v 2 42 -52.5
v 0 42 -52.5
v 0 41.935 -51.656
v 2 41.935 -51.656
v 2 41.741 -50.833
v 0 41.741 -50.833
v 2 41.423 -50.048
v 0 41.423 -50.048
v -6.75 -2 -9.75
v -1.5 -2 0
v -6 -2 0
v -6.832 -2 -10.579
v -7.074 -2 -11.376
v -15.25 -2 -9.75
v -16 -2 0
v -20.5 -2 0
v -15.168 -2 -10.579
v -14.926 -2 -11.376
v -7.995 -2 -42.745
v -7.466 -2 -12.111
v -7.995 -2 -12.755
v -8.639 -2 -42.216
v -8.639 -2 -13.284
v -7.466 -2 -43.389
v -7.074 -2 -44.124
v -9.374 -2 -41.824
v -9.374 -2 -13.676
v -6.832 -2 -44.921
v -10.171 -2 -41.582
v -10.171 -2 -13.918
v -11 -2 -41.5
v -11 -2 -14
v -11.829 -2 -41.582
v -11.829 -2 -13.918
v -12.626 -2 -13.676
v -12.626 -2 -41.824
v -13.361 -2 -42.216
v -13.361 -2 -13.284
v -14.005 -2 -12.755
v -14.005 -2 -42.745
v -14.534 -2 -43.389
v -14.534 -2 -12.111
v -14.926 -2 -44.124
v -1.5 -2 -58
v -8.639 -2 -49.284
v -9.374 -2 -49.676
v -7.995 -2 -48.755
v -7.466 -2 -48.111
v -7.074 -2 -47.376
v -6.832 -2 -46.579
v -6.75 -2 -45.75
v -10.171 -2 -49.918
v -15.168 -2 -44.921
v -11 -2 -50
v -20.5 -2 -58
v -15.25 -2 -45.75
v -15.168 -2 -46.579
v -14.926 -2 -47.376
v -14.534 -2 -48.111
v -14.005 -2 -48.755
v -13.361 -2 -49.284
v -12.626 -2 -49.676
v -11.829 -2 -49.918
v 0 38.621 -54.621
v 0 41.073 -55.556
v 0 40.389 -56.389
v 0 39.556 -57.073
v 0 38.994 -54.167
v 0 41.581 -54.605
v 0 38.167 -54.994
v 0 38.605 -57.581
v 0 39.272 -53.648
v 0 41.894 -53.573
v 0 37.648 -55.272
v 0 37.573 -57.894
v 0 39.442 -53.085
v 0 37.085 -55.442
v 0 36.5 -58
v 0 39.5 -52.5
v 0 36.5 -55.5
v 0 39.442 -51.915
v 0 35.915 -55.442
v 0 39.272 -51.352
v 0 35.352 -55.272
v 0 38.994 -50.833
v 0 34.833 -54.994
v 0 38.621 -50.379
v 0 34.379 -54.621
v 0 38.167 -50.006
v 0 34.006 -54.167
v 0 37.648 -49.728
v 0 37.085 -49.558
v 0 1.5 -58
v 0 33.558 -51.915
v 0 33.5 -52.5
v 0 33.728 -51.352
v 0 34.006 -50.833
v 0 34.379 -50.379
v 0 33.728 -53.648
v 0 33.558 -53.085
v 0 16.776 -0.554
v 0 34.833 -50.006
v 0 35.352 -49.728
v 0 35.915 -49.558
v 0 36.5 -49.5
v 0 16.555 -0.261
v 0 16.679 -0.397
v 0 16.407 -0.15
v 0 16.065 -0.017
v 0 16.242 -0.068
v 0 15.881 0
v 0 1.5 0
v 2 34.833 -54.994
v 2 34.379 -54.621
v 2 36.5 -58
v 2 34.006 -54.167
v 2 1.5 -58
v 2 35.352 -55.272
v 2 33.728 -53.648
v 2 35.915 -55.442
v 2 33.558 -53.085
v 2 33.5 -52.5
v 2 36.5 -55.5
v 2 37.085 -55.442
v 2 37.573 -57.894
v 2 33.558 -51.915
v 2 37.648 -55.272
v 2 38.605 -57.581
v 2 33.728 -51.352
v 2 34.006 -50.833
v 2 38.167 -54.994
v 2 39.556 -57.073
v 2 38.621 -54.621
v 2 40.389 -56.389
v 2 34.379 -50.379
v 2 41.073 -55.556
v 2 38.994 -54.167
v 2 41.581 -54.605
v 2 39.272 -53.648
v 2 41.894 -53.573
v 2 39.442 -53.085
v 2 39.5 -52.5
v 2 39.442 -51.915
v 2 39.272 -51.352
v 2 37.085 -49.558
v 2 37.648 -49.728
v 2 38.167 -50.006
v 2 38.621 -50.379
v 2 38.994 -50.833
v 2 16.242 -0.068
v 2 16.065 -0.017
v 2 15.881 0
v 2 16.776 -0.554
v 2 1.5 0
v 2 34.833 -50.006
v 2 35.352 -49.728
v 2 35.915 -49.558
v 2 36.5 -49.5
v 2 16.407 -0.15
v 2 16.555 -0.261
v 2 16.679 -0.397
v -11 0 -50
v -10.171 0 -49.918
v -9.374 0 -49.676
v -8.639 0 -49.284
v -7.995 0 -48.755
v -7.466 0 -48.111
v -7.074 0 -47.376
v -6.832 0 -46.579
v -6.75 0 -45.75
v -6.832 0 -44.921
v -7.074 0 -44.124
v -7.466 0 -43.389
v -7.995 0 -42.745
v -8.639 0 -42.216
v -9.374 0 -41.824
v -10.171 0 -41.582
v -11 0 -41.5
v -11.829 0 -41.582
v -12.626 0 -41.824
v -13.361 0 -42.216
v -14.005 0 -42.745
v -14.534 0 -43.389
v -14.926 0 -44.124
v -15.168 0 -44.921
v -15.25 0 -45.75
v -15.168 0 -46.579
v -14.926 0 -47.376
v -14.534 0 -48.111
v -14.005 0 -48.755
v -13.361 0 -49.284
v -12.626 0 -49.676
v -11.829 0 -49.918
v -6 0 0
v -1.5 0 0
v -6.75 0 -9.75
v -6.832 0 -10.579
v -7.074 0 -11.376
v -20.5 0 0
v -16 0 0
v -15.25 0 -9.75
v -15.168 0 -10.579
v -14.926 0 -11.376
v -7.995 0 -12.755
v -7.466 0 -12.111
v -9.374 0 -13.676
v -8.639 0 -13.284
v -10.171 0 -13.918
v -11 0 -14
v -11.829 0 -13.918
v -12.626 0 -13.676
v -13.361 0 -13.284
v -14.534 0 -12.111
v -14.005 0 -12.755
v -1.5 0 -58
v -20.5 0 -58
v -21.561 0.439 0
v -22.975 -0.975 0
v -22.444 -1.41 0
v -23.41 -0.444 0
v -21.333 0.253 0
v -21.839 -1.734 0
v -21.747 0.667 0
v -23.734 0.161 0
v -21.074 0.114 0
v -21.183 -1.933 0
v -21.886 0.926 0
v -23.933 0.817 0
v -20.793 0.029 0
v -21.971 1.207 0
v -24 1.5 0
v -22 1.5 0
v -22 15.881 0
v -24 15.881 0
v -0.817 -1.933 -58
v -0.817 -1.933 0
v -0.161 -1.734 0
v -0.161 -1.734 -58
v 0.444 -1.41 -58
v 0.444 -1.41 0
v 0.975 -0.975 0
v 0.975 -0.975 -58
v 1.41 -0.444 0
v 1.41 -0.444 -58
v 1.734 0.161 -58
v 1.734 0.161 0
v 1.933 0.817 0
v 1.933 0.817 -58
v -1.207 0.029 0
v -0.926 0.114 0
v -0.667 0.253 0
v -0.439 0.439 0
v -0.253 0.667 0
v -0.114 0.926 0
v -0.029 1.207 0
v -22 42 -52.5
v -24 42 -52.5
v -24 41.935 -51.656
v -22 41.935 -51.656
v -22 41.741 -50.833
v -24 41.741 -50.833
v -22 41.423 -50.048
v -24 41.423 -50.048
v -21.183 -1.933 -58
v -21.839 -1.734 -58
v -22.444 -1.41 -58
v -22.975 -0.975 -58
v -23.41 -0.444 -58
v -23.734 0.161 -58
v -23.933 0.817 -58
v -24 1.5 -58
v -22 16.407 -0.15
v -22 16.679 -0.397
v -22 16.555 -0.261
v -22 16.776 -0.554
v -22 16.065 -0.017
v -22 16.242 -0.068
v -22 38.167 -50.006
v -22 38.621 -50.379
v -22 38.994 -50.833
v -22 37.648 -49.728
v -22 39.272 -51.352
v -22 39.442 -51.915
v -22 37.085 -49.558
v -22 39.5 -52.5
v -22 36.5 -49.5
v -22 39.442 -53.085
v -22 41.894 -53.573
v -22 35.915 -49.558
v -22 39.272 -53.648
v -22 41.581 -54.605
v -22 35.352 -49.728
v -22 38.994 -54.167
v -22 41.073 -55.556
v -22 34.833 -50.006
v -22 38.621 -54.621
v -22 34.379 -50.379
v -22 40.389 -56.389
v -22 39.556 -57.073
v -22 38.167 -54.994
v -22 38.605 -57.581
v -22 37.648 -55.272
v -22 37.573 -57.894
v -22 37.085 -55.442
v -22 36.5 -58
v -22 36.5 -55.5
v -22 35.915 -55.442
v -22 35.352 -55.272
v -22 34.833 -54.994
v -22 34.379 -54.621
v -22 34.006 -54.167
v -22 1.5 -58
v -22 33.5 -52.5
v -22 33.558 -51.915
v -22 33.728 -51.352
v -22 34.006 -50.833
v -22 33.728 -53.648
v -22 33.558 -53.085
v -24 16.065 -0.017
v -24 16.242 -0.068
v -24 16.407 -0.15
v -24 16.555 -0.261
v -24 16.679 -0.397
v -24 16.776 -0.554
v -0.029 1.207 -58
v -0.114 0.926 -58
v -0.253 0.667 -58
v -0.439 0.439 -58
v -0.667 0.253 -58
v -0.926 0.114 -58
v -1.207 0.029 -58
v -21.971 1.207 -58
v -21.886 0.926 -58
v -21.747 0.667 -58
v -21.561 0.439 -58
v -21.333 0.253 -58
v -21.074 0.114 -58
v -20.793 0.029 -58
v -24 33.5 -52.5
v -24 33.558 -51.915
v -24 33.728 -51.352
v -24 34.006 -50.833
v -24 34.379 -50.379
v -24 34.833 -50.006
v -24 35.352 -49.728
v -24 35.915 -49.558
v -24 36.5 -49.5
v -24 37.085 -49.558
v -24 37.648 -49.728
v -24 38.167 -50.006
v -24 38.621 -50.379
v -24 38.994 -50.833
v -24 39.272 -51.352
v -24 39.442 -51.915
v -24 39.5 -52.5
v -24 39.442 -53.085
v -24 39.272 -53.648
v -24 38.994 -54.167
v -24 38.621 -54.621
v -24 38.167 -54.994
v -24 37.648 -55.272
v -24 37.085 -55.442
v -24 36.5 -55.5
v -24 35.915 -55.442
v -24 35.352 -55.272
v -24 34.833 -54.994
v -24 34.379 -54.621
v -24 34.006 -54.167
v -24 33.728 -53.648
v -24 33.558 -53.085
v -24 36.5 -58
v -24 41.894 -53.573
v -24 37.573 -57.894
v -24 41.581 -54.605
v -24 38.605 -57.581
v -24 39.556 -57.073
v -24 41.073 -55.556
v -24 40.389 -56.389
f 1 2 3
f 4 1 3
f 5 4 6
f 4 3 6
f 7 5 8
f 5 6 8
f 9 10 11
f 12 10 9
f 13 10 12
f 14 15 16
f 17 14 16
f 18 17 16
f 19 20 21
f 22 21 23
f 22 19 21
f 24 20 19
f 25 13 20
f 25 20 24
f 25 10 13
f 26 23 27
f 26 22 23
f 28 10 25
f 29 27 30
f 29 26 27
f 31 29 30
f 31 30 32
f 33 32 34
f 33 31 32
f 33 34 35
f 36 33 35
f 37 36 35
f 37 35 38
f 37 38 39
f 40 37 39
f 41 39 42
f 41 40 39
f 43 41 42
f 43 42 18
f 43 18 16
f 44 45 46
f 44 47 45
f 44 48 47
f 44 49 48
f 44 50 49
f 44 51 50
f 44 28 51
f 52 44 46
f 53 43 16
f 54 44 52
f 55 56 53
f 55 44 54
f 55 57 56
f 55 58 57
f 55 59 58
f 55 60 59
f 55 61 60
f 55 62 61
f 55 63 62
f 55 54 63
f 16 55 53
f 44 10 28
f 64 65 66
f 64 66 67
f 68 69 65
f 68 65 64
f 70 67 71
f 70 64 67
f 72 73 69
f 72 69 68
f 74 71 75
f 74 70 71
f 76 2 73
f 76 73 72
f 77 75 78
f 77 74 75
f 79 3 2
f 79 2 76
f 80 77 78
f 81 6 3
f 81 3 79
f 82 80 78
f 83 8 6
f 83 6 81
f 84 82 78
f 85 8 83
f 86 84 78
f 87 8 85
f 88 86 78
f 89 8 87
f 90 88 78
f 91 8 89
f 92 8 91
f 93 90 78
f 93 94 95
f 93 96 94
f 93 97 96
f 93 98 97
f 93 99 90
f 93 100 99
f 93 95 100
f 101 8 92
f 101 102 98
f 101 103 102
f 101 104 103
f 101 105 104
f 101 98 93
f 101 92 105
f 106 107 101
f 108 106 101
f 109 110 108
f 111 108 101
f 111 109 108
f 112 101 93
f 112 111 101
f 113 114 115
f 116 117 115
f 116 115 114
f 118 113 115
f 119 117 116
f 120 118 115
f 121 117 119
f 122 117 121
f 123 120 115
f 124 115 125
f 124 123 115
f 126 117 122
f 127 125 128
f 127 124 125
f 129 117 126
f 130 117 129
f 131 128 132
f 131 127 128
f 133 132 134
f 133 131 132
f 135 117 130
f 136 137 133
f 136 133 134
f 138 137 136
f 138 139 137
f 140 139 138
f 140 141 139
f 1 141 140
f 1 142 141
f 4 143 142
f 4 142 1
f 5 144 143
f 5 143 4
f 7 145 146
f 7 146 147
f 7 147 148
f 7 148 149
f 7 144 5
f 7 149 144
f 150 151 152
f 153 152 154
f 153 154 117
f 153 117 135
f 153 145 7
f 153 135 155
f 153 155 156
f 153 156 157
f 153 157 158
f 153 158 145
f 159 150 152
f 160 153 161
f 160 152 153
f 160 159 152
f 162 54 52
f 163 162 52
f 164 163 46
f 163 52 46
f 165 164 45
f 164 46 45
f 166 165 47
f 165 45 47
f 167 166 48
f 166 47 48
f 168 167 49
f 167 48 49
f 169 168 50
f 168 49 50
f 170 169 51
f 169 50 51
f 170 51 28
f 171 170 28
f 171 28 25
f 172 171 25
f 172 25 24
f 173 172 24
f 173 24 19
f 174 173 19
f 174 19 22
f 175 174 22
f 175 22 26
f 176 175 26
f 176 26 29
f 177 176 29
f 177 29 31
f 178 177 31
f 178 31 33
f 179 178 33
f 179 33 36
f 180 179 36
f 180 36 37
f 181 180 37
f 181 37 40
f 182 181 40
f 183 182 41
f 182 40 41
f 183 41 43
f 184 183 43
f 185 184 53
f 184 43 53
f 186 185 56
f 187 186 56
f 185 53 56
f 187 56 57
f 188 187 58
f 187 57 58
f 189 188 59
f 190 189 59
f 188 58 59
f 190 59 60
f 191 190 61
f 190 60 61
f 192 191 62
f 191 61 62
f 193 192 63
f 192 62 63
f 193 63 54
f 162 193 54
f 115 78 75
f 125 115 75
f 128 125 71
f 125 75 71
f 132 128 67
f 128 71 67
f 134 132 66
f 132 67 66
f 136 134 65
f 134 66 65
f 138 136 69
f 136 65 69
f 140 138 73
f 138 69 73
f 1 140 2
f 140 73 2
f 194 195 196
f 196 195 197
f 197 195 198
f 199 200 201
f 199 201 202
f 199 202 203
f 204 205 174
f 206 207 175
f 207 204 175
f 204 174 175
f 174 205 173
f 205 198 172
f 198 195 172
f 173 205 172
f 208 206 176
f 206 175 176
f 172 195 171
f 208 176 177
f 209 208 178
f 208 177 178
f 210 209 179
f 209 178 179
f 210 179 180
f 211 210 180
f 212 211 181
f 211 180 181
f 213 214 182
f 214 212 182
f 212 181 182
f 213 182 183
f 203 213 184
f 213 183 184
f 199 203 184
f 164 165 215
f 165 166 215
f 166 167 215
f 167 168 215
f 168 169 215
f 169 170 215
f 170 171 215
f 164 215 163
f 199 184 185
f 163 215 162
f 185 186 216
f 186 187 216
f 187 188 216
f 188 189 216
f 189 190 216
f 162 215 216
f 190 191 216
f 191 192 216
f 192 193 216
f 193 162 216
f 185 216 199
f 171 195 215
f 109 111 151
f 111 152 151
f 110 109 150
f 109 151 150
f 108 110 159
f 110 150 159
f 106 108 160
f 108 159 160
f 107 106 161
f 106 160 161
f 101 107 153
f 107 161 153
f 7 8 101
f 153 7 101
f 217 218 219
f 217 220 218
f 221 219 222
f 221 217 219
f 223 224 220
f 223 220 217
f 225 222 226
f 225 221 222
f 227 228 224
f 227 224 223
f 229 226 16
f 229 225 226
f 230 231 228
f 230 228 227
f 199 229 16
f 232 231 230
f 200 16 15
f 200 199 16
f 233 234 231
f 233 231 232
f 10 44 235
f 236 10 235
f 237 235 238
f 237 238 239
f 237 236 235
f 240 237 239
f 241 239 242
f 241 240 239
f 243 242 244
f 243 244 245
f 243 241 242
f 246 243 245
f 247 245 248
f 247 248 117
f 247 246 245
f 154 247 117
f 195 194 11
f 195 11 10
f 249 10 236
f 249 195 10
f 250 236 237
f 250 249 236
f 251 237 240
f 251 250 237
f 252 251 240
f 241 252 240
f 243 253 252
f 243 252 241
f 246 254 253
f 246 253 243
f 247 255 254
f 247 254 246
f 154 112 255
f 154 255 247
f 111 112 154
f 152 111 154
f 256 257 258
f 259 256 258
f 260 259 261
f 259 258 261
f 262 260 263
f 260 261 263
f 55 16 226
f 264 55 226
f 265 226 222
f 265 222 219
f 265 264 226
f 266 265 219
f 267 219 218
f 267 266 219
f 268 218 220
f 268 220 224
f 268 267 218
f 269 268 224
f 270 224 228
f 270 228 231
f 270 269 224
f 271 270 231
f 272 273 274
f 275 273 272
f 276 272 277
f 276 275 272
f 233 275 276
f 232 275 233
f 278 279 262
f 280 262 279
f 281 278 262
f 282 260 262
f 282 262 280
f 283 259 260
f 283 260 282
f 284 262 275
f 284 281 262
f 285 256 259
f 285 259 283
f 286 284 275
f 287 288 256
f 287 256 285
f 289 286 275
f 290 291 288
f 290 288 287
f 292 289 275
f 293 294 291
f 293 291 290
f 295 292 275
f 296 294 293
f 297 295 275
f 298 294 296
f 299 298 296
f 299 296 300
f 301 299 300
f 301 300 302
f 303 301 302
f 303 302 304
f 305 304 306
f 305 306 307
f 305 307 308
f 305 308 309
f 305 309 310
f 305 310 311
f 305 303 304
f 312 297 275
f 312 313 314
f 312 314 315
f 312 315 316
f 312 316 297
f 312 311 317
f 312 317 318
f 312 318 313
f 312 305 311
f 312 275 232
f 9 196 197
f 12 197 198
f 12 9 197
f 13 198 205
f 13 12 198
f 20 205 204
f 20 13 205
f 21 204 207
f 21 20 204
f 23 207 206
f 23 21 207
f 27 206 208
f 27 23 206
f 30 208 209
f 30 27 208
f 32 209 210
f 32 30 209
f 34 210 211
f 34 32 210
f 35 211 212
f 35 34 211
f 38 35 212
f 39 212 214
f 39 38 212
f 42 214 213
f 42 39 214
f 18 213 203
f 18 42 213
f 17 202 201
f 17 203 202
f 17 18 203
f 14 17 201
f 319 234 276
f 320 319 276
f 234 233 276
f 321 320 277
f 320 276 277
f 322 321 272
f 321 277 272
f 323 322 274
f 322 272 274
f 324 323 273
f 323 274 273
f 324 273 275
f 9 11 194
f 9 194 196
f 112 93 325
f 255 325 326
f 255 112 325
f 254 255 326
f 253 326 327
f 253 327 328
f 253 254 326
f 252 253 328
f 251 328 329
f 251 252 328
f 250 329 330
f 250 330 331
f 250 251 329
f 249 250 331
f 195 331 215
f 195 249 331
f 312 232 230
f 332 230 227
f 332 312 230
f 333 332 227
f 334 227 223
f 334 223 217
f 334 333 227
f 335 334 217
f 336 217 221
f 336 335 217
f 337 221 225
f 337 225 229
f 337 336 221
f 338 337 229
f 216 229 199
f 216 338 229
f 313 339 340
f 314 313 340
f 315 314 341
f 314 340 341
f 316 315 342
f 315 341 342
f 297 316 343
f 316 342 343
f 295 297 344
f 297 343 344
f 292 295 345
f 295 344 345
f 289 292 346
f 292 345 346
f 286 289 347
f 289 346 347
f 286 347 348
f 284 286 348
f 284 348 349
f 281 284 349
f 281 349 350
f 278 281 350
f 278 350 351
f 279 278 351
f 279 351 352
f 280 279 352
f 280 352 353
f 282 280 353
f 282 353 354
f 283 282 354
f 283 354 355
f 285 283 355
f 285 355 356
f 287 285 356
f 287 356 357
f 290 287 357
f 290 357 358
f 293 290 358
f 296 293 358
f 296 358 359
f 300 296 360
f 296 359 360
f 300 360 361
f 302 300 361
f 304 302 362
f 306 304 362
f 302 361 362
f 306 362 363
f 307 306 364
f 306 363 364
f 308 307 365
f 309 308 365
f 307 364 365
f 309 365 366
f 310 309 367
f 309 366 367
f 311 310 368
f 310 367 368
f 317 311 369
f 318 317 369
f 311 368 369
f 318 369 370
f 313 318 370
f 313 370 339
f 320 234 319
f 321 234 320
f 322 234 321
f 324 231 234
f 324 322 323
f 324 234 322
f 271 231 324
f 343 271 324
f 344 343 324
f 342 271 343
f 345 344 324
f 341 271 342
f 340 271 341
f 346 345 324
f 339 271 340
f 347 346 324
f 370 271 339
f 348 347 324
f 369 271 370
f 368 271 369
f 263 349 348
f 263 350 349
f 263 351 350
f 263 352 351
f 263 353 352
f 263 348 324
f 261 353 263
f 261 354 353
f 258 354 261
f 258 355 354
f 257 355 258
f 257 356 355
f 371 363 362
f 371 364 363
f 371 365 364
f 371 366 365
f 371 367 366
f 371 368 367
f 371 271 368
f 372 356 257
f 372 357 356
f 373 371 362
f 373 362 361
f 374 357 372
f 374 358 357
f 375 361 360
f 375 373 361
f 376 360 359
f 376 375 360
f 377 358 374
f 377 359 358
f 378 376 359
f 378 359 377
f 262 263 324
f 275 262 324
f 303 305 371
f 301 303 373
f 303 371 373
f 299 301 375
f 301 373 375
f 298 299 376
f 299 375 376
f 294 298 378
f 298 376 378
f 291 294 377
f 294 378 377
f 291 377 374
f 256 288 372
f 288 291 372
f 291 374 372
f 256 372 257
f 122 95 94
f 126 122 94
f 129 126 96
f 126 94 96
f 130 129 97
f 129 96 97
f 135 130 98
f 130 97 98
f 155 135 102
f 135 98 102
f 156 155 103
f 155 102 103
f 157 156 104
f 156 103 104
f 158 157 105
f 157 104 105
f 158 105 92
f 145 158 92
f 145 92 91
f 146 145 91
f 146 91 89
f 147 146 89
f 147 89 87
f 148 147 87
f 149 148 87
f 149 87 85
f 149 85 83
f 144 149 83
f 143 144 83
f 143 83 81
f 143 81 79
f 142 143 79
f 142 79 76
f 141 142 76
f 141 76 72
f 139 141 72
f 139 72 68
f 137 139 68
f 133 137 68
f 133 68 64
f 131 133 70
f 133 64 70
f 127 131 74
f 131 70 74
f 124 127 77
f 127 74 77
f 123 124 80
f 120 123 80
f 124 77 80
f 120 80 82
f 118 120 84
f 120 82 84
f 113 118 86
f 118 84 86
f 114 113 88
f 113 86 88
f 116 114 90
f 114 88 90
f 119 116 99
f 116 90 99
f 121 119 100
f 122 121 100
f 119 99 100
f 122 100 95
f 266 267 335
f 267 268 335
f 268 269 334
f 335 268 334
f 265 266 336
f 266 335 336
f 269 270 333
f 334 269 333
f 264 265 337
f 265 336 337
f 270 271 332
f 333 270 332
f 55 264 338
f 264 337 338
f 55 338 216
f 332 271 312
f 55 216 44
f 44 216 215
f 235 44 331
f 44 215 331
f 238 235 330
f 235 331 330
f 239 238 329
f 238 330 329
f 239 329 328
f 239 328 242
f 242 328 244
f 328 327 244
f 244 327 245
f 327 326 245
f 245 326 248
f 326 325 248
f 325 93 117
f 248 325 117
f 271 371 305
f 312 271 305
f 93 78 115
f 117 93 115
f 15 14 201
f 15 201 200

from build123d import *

# Parameters (mm, degrees)
BASE_FLANGIA1_DEPTH            = 2
BORDO_FLANGIA1_STRIP_W         = 11
BORDO_FLANGIA1_STRIP_H         = 2
BORDO_FLANGIA1_STRIP_CUT_DEPTH = 58
BORDO_FLANGIA1_DEPTH           = 58
BORDO_FLANGIA2_STRIP_W         = 11
BORDO_FLANGIA2_STRIP_H         = 2
BORDO_FLANGIA2_STRIP_CUT_DEPTH = 58
BORDO_FLANGIA2_DEPTH           = 58
SCHIZZO11_R                    = 3
TAGLIO_ESTRUSIONE1_DEPTH       = 50
RACCORDO2_R                    = 1
SCHIZZO16_R                    = 4.25
TAGLIO_ESTRUSIONE2_DEPTH       = 10


# Sheet-metal steps are written as plain solids
with BuildPart() as part:
    # Schizzo1 → Base-Flangia1 (new body)
    with BuildSketch(Plane(origin=(0, 0, 0), x_dir=(1, 0, 0), z_dir=(0, 1, 0))):
        Polygon((0, 0), (-6, 0), (-16, 0), (-22, 0), (-22, 58), (0, 58), align=None)
    extrude(amount=-BASE_FLANGIA1_DEPTH)

    # Bordo-Flangia1 strip (across the edge) → Bordo-Flangia1 strip cut (cut)
    with BuildSketch(Plane(origin=(-22, 0, -58), x_dir=(1, 0, 0), z_dir=(0, 0, 1))):
        with Locations((-4, -1)):
            Rectangle(BORDO_FLANGIA1_STRIP_W, BORDO_FLANGIA1_STRIP_H)
    extrude(amount=BORDO_FLANGIA1_STRIP_CUT_DEPTH, mode=Mode.SUBTRACT)

    # Bordo-Flangia1 section (across the edge) → Bordo-Flangia1 (add)
    with BuildSketch(Plane(origin=(-22, 0, -58), x_dir=(1, 0, 0), z_dir=(0, 0, 1))):
        with BuildLine():
            Line((-2, 1.5), (-2, 42))
            Line((-2, 42), (0, 42))
            Line((0, 42), (0, 1.5))
            ThreePointArc((0, 1.5), (0.439339828, 0.439339828), (1.5, 0))
            Line((1.5, 0), (1.5, -2))
            ThreePointArc((1.5, -2), (-0.974873734, -0.974873734), (-2, 1.5))
        make_face()
    extrude(amount=BORDO_FLANGIA1_DEPTH)

    # Bordo-Flangia2 strip (across the edge) → Bordo-Flangia2 strip cut (cut)
    with BuildSketch(Plane(origin=(0, 0, 0), x_dir=(-1, 0, 0), z_dir=(0, 0, -1))):
        with Locations((-4, -1)):
            Rectangle(BORDO_FLANGIA2_STRIP_W, BORDO_FLANGIA2_STRIP_H)
    extrude(amount=BORDO_FLANGIA2_STRIP_CUT_DEPTH, mode=Mode.SUBTRACT)

    # Bordo-Flangia2 section (across the edge) → Bordo-Flangia2 (add)
    with BuildSketch(Plane(origin=(0, 0, 0), x_dir=(-1, 0, 0), z_dir=(0, 0, -1))):
        with BuildLine():
            Line((-2, 1.5), (-2, 42))
            Line((-2, 42), (0, 42))
            Line((0, 42), (0, 1.5))
            ThreePointArc((0, 1.5), (0.439339828, 0.439339828), (1.5, 0))
            Line((1.5, 0), (1.5, -2))
            ThreePointArc((1.5, -2), (-0.974873734, -0.974873734), (-2, 1.5))
        make_face()
    extrude(amount=BORDO_FLANGIA2_DEPTH)

    # Schizzo11 → Taglio-Estrusione1 (cut)
    with BuildSketch(Plane.ZY.offset(24)):
        with BuildLine():
            Line((-58, 42), (-58, 36.5))
            ThreePointArc((-58, 36.5), (-56.389087297, 40.389087297), (-52.5, 42))
            Line((-52.5, 42), (-58, 42))
        make_face()
        with BuildLine():
            Line((-50.048262739, 41.42331031), (0, 16.5))
            Line((0, 16.5), (0, 42))
            Line((0, 42), (-52.5, 42))
            ThreePointArc((-52.5, 42), (-51.240676114, 41.853886752), (-50.048262739, 41.42331031))
        make_face()
        with Locations(Location((-52.5, 36.5, 0), (0, 0, 270))):
            Circle(SCHIZZO11_R)
    extrude(amount=-TAGLIO_ESTRUSIONE1_DEPTH, mode=Mode.SUBTRACT)

    # Raccordo2
    raccordo2_edges = [part.edges().sort_by_distance(p)[0] for p in [
        (1, 16.5, 0),
        (-23, 16.5, 0),
    ]]
    fillet(raccordo2_edges, radius=RACCORDO2_R)

    # Schizzo16 → Taglio-Estrusione2 (cut)
    with BuildSketch(Plane.XZ.offset(2)):
        with Locations(Location((-11, -45.75, 0), (0, 0, 270))):
            Circle(SCHIZZO16_R)
        with BuildLine():
            Line((-15.25, -9.75), (-16, 0))
            Line((-16, 0), (-6, 0))
            Line((-6, 0), (-6.75, -9.75))
            ThreePointArc((-6.75, -9.75), (-11, -14), (-15.25, -9.75))
        make_face()
    extrude(amount=-TAGLIO_ESTRUSIONE2_DEPTH, mode=Mode.SUBTRACT)


solid = part.part
